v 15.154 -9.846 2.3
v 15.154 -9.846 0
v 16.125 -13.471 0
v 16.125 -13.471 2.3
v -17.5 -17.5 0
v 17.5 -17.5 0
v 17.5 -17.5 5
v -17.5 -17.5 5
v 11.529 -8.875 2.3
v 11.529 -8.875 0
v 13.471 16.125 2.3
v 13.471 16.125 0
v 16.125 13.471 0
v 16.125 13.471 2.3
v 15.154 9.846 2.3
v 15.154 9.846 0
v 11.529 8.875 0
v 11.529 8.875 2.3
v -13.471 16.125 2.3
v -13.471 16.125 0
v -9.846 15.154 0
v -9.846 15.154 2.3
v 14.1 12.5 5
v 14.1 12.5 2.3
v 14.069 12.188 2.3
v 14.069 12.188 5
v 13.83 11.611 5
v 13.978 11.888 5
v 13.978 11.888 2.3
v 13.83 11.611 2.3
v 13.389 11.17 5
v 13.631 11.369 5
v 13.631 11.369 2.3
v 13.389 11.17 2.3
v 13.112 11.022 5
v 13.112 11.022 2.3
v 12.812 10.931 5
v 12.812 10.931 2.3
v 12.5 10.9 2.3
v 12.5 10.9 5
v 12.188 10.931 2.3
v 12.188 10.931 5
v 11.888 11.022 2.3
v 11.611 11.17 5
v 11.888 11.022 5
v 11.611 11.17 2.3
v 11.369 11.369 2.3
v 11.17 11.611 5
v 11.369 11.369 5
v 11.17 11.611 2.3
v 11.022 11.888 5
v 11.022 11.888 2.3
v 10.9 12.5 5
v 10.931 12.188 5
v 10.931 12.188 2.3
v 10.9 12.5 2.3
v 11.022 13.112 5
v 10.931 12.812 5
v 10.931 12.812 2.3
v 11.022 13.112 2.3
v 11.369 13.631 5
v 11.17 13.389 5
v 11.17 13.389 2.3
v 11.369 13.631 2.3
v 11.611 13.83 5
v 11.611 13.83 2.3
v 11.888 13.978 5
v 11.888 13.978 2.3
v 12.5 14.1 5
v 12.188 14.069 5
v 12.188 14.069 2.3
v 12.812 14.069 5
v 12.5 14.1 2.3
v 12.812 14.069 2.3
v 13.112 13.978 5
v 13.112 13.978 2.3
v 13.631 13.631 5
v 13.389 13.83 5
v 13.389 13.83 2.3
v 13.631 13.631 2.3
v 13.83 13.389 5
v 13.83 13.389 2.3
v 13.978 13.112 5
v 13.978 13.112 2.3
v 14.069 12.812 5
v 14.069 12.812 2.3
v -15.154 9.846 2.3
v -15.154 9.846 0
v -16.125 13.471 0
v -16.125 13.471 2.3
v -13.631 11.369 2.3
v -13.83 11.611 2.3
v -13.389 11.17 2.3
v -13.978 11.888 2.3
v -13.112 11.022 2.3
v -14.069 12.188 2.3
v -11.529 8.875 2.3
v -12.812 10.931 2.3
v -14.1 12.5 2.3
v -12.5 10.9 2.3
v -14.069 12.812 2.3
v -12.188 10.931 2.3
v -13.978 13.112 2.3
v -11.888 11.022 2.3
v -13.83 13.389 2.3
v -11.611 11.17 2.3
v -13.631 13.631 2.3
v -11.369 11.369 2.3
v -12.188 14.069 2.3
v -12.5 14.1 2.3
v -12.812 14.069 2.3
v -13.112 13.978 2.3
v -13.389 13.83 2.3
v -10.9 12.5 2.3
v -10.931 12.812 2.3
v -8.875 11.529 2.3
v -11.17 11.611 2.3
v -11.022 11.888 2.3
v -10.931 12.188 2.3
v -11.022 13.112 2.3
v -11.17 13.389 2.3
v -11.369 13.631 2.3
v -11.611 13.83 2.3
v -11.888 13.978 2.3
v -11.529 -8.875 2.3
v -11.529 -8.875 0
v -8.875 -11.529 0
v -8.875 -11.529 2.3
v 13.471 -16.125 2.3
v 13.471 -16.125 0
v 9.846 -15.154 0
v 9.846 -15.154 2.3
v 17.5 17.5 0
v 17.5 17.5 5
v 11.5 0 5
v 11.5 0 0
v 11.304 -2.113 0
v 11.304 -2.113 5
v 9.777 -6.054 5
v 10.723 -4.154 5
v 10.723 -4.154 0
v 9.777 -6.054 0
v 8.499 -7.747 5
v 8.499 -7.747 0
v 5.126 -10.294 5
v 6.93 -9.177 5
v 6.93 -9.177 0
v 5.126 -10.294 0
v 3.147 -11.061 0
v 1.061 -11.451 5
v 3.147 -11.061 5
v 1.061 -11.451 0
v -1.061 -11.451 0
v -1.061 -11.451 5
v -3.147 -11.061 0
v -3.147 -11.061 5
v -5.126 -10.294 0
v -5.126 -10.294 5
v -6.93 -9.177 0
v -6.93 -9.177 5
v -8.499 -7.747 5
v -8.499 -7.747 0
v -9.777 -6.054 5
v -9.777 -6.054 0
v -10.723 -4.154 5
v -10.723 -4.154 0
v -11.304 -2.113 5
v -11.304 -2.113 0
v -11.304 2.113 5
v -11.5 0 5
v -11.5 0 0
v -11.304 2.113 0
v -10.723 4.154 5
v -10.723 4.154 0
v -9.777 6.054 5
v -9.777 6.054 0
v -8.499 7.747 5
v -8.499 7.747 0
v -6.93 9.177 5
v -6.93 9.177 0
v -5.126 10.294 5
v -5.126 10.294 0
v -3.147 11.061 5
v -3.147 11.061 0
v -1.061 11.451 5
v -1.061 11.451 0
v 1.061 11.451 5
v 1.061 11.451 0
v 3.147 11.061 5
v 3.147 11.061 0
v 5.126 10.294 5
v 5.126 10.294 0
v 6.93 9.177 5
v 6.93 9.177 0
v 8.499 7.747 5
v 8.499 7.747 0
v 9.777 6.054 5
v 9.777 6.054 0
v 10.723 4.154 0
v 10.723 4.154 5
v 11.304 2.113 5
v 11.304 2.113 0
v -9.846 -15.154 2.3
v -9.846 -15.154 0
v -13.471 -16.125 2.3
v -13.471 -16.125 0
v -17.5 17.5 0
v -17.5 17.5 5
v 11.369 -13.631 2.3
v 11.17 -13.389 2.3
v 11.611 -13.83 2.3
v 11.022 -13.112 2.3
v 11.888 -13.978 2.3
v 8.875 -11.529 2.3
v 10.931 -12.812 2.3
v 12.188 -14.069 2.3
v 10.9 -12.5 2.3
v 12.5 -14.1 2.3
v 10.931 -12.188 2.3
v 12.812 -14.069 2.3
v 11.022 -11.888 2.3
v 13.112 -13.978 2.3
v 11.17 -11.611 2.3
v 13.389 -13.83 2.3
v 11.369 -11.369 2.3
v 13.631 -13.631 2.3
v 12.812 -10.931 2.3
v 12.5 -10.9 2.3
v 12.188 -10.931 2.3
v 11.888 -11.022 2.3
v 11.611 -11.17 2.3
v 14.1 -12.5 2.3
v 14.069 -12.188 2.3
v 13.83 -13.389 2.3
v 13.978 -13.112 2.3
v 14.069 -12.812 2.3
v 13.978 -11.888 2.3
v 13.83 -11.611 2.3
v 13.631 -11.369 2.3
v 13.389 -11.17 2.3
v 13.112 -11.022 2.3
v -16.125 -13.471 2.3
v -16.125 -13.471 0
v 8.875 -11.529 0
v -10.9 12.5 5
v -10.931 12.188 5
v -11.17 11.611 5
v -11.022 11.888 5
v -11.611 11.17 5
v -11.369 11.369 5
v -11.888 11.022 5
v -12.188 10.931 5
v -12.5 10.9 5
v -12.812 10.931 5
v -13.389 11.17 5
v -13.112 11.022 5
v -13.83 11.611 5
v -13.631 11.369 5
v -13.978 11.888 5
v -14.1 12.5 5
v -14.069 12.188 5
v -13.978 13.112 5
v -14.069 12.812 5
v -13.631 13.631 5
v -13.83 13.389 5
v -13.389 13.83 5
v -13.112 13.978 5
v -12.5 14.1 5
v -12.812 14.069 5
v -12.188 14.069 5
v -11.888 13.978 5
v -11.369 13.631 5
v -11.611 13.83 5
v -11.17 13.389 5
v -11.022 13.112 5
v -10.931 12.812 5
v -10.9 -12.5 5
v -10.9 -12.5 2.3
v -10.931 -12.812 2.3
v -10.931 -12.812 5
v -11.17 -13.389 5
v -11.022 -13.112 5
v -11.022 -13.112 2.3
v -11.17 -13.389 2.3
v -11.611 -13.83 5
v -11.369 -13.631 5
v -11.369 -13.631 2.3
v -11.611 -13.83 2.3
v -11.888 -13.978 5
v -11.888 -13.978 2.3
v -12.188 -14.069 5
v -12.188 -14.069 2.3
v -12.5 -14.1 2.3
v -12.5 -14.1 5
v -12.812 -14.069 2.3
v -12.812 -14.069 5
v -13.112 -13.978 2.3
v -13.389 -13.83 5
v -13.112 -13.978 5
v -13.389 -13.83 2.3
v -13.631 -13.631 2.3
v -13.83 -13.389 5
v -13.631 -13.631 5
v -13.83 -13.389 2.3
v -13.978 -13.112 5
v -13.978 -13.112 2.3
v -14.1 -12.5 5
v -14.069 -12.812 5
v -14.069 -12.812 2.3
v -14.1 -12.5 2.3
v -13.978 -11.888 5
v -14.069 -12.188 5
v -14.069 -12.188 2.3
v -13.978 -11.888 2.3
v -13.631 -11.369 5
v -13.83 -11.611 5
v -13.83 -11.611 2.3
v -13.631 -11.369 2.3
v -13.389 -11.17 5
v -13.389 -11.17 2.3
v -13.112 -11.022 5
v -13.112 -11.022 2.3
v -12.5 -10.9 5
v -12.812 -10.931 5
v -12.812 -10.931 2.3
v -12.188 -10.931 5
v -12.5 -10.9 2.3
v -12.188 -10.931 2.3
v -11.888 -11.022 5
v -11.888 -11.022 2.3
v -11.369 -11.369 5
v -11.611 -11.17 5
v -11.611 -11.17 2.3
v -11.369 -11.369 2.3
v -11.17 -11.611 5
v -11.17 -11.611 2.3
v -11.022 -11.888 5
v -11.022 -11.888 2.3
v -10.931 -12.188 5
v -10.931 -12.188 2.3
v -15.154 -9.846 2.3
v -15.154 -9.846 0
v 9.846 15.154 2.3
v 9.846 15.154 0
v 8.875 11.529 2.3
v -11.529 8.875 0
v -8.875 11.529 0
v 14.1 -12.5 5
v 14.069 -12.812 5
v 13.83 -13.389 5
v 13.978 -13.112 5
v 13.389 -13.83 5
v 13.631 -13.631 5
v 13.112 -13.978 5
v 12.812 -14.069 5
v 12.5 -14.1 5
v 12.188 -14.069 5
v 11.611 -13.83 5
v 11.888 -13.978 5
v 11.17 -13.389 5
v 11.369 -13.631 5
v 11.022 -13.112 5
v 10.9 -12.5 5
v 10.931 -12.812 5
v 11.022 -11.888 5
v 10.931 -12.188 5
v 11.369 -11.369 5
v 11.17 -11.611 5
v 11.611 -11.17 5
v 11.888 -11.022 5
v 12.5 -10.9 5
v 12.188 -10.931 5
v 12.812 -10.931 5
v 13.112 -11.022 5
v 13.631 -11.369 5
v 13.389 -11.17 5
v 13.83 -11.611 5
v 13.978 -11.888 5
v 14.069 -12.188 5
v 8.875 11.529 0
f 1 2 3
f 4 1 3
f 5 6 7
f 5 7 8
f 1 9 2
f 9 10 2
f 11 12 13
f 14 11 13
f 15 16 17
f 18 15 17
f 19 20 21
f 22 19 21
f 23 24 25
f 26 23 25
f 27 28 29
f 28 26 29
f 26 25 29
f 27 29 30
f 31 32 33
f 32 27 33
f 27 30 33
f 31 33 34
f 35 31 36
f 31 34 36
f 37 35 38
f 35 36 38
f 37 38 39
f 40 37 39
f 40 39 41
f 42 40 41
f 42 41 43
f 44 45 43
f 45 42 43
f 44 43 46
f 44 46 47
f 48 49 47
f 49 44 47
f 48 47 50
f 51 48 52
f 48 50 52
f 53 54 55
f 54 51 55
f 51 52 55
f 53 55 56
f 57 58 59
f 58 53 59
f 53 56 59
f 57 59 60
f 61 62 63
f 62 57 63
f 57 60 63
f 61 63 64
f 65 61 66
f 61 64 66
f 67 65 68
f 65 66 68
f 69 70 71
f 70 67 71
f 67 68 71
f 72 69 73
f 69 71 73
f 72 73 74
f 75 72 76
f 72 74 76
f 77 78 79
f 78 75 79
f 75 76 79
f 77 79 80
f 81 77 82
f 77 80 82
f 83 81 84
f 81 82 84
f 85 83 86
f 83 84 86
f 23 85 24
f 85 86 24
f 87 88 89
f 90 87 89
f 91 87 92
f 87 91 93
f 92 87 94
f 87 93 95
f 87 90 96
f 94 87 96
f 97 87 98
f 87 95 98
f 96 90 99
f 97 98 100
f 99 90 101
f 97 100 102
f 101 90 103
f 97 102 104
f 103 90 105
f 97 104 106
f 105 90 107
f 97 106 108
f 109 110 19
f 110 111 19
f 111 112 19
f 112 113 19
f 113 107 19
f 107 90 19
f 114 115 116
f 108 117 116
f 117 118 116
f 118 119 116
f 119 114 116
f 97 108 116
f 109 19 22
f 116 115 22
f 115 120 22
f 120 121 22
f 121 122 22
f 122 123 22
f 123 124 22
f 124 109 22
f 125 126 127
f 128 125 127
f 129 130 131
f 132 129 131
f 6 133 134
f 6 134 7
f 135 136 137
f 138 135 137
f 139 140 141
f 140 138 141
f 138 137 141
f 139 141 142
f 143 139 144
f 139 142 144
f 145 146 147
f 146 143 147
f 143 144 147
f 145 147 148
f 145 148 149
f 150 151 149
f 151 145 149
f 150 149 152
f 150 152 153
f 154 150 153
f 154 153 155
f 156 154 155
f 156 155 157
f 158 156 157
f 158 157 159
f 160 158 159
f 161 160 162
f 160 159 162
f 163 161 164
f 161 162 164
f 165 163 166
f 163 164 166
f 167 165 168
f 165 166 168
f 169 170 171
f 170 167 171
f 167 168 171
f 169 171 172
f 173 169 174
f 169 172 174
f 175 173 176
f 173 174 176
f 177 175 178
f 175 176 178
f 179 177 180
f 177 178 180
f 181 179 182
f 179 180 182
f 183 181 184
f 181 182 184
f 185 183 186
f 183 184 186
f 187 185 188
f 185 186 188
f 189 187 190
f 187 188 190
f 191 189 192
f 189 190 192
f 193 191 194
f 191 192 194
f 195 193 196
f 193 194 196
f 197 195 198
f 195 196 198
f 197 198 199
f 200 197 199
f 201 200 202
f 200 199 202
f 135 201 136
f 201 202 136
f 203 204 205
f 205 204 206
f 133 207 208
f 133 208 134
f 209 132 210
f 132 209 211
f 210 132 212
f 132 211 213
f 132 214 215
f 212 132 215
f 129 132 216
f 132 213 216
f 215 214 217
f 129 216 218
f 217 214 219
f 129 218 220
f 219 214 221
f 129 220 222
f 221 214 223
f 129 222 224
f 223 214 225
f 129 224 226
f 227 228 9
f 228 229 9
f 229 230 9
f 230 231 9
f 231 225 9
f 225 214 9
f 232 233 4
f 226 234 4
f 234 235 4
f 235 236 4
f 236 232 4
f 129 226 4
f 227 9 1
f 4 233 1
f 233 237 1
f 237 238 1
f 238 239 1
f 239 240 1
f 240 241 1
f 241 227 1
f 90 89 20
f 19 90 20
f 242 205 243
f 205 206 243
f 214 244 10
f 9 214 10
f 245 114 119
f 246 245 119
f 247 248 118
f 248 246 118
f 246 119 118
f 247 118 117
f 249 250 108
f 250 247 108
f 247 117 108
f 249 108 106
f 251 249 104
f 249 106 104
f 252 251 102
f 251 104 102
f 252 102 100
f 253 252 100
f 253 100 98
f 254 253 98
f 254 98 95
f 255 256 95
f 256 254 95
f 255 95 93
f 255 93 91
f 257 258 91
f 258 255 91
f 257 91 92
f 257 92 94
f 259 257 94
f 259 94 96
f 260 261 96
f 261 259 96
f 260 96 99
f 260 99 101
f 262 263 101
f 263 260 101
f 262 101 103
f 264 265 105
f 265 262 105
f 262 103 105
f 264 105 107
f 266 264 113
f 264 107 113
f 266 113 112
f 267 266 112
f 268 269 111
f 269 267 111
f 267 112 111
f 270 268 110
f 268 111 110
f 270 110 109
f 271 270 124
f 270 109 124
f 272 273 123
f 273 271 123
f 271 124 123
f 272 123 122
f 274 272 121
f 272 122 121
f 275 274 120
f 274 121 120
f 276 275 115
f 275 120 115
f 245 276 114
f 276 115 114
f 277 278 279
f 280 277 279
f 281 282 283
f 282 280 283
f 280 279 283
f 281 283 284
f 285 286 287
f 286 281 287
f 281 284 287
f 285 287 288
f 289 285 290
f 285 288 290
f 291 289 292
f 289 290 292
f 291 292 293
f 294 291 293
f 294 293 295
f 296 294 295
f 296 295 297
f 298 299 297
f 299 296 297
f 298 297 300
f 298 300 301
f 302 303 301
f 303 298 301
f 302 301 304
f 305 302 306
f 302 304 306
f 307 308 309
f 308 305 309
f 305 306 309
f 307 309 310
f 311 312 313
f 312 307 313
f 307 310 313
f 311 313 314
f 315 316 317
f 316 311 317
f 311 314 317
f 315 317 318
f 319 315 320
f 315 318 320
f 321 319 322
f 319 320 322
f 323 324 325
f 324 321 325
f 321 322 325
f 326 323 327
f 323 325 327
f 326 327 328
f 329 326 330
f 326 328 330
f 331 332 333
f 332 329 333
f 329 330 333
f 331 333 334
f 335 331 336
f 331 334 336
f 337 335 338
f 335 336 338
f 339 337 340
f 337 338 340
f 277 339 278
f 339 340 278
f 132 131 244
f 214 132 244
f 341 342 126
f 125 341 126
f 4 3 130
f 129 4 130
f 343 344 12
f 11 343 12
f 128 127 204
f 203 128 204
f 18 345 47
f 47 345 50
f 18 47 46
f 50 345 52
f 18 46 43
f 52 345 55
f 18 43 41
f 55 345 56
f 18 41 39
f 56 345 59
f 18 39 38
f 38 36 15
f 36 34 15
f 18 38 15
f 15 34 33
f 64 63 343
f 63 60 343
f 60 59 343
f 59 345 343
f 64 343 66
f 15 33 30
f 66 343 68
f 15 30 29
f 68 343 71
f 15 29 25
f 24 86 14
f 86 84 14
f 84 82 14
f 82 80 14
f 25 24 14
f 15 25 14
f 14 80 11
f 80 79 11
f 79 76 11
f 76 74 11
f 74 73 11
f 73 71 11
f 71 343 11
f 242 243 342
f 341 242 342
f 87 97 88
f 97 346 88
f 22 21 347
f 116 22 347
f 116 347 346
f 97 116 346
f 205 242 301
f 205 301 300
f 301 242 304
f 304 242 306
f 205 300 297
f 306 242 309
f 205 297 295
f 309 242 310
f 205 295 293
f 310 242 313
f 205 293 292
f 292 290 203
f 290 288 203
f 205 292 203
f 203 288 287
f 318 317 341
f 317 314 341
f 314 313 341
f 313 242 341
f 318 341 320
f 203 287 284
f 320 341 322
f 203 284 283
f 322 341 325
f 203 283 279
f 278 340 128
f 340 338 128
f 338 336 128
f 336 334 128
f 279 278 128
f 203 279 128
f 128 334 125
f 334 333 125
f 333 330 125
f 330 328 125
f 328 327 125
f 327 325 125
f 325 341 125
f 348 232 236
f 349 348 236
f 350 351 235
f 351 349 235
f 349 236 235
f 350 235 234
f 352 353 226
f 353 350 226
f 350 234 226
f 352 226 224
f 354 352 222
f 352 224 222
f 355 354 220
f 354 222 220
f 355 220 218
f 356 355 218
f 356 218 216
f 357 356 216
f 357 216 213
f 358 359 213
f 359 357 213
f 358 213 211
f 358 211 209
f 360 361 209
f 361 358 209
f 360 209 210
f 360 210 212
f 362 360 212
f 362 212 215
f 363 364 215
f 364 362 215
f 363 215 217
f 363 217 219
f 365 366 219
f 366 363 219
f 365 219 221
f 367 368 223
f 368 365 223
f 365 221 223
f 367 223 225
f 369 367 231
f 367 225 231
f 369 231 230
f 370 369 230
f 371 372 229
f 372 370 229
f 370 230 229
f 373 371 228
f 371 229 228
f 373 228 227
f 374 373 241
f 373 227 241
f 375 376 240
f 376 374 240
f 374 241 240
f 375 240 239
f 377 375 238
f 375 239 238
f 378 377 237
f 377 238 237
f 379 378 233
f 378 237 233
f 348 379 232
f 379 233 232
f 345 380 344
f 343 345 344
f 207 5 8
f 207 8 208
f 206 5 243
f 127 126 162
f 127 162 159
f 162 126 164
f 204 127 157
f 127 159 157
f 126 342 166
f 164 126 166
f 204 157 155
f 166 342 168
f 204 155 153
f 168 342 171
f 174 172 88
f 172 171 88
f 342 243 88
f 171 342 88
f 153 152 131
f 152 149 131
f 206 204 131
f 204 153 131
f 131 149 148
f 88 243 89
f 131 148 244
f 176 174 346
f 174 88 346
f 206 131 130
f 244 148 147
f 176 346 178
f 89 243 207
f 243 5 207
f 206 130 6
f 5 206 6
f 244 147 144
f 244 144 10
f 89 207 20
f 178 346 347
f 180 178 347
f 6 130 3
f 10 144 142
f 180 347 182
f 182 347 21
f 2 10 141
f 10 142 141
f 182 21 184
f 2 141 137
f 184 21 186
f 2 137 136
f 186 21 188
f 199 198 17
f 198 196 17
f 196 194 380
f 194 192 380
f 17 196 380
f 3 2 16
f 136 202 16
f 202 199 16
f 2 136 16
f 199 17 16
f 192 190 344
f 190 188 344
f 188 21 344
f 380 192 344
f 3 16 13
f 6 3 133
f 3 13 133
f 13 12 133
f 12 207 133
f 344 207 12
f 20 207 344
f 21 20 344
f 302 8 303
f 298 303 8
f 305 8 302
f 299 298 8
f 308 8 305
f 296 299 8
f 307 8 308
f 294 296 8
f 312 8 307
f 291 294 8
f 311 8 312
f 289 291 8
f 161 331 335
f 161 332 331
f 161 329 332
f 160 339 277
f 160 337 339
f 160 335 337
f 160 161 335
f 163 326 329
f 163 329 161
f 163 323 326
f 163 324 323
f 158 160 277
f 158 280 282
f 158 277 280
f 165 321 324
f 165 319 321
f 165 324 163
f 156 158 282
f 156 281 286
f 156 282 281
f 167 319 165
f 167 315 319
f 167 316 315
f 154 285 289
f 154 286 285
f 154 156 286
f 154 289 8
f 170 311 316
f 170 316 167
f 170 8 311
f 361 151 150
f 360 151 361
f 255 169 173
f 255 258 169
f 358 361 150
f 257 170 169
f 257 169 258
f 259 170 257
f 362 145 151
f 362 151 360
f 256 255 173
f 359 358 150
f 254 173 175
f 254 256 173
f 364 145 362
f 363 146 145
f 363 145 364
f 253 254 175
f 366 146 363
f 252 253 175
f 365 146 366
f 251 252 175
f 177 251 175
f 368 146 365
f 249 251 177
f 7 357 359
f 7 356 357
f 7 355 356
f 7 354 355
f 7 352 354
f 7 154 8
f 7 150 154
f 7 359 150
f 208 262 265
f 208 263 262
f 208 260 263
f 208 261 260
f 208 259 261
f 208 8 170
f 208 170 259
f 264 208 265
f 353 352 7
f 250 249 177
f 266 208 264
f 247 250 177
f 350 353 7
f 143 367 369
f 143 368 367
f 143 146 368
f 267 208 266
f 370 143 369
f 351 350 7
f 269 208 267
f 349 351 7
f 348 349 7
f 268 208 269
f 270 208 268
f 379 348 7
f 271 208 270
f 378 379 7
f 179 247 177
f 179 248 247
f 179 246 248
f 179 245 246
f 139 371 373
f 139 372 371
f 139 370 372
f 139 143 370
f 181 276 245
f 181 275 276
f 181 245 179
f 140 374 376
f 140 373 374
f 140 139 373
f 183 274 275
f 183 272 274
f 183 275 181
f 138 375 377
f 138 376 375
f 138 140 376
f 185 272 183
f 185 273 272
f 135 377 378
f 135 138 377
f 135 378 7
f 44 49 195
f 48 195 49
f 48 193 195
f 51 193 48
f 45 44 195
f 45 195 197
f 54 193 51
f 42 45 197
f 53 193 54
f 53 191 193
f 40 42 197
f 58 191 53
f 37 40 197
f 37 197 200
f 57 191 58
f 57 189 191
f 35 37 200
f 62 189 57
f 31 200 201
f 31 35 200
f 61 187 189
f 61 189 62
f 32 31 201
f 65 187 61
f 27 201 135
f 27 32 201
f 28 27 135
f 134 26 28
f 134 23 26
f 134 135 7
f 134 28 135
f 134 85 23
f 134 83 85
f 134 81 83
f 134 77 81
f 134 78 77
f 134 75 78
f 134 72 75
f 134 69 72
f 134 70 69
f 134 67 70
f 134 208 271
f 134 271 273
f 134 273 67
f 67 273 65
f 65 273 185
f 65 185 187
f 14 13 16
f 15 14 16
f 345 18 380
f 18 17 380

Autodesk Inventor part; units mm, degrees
ref_plane "YZ Plane" through (0, 0, 0) normal (1, 0, 0) x (0, 1, 0)
ref_plane "XZ Plane" through (0, 0, 0) normal (0, 1, 0) x (-1, 0, 0)
ref_plane "XY Plane" through (0, 0, 0) normal (0, 0, 1) x (1, 0, 0)
sketch "Sketch1" plane through (0, 0, 0) normal (0, 0, 1) x (1, 0, 0)
  circle A0 centre (0, 0) radius 11.5
  circle A1 centre (0, 0) radius 14.3 construction
  line L0 (-17.5, 17.5) -> (17.5, 17.5)
  line L1 (17.5, 17.5) -> (17.5, -17.5)
  line L2 (17.5, -17.5) -> (-17.5, -17.5)
  line L3 (-17.5, -17.5) -> (-17.5, 17.5)
  line L4 (-12.5, 12.5) -> (12.5, 12.5) construction
  line L5 (12.5, 12.5) -> (12.5, -12.5) construction
  line L6 (12.5, -12.5) -> (-12.5, -12.5) construction
  line L7 (-12.5, -12.5) -> (-12.5, 12.5) construction
  line L8 (-9.8464, 15.1536) -> (-8.8751, 11.5287)
  line L9 (-8.8751, 11.5287) -> (-11.5287, 8.8751)
  line L10 (-11.5287, 8.8751) -> (-15.1536, 9.8464)
  line L11 (-15.1536, 9.8464) -> (-16.1249, 13.4713)
  line L12 (-16.1249, 13.4713) -> (-13.4713, 16.1249)
  line L13 (-13.4713, 16.1249) -> (-9.8464, 15.1536)
  line L14 (15.1536, 9.8464) -> (11.5287, 8.8751)
  line L15 (11.5287, 8.8751) -> (8.8751, 11.5287)
  line L16 (8.8751, 11.5287) -> (9.8464, 15.1536)
  line L17 (9.8464, 15.1536) -> (13.4713, 16.1249)
  line L18 (13.4713, 16.1249) -> (16.1249, 13.4713)
  line L19 (16.1249, 13.4713) -> (15.1536, 9.8464)
  line L20 (15.1536, -9.8464) -> (16.1249, -13.4713)
  line L21 (16.1249, -13.4713) -> (13.4713, -16.1249)
  line L22 (13.4713, -16.1249) -> (9.8464, -15.1536)
  line L23 (9.8464, -15.1536) -> (8.8751, -11.5287)
  line L24 (8.8751, -11.5287) -> (11.5287, -8.8751)
  line L25 (11.5287, -8.8751) -> (15.1536, -9.8464)
  line L26 (-15.1536, -9.8464) -> (-11.5287, -8.8751)
  line L27 (-11.5287, -8.8751) -> (-8.8751, -11.5287)
  line L28 (-8.8751, -11.5287) -> (-9.8464, -15.1536)
  line L29 (-9.8464, -15.1536) -> (-13.4713, -16.1249)
  line L30 (-13.4713, -16.1249) -> (-16.1249, -13.4713)
  line L31 (-16.1249, -13.4713) -> (-15.1536, -9.8464)
  line L32 (-12.5, 12.5) -> (12.5, -12.5) construction
  line L33 (12.5, 12.5) -> (-12.5, -12.5) construction
  circle A2 centre (-12.5, 12.5) radius 1.6
  circle A3 centre (12.5, 12.5) radius 1.6
  circle A4 centre (12.5, -12.5) radius 1.6
  circle A5 centre (-12.5, -12.5) radius 1.6
  dimension "d0" = 28.6
  dimension "d1" = 23
  dimension "d6" = 6.5
  dimension "d7" = 25
  dimension "d8" = 25
  dimension "d9" = 3.2
  dimension "d10" = 35
  dimension "d11" = 17.5
  dimension "d12" = 35
  dimension "d13" = 17.5
extrude "Extrusion3" add sketch "Sketch1" along normal blind 5 contours L0 L1 L2 L3 | L8 L9 L10 L11 L12 L13 | L14 L15 L16 L17 L18 L19 | L20 L21 L22 L23 L24 L25 | L26 L27 L28 L29 L30 L31
extrude "Extrusion4" cut sketch "Sketch1" along normal blind 2.3 contours L8 L9 L10 L11 L12 L13 | L14 L15 L16 L17 L18 L19 | L20 L21 L22 L23 L24 L25 | L26 L27 L28 L29 L30 L31
sketch "Sketch2" plane through (0, 0, 5) normal (0, 0, 1) x (1, 0, 0)
  circle A0 centre (-12.5, -12.5) radius 1.6 projected
  circle A1 centre (12.5, -12.5) radius 1.6 projected
  circle A2 centre (12.5, 12.5) radius 1.6 projected
  circle A3 centre (-12.5, 12.5) radius 1.6 projected
  circle A4 centre (0, 0) radius 11.5 projected
  line L0 (17.5, 17.5) -> (-17.5, 17.5) projected
  line L1 (-17.5, 17.5) -> (-17.5, -17.5) projected
  line L2 (-17.5, -17.5) -> (17.5, -17.5) projected
  line L3 (17.5, -17.5) -> (17.5, 17.5) projected
  dimension "d18" = 23
  dimension "d19" = 12.5
  dimension "d20" = 25
  dimension "d21" = 25
equation "\"d11\" = 0.5 * d10"
equation "\"d13\" = 0.5 * d12"
properties part number "BallBearingHolderOutside"
